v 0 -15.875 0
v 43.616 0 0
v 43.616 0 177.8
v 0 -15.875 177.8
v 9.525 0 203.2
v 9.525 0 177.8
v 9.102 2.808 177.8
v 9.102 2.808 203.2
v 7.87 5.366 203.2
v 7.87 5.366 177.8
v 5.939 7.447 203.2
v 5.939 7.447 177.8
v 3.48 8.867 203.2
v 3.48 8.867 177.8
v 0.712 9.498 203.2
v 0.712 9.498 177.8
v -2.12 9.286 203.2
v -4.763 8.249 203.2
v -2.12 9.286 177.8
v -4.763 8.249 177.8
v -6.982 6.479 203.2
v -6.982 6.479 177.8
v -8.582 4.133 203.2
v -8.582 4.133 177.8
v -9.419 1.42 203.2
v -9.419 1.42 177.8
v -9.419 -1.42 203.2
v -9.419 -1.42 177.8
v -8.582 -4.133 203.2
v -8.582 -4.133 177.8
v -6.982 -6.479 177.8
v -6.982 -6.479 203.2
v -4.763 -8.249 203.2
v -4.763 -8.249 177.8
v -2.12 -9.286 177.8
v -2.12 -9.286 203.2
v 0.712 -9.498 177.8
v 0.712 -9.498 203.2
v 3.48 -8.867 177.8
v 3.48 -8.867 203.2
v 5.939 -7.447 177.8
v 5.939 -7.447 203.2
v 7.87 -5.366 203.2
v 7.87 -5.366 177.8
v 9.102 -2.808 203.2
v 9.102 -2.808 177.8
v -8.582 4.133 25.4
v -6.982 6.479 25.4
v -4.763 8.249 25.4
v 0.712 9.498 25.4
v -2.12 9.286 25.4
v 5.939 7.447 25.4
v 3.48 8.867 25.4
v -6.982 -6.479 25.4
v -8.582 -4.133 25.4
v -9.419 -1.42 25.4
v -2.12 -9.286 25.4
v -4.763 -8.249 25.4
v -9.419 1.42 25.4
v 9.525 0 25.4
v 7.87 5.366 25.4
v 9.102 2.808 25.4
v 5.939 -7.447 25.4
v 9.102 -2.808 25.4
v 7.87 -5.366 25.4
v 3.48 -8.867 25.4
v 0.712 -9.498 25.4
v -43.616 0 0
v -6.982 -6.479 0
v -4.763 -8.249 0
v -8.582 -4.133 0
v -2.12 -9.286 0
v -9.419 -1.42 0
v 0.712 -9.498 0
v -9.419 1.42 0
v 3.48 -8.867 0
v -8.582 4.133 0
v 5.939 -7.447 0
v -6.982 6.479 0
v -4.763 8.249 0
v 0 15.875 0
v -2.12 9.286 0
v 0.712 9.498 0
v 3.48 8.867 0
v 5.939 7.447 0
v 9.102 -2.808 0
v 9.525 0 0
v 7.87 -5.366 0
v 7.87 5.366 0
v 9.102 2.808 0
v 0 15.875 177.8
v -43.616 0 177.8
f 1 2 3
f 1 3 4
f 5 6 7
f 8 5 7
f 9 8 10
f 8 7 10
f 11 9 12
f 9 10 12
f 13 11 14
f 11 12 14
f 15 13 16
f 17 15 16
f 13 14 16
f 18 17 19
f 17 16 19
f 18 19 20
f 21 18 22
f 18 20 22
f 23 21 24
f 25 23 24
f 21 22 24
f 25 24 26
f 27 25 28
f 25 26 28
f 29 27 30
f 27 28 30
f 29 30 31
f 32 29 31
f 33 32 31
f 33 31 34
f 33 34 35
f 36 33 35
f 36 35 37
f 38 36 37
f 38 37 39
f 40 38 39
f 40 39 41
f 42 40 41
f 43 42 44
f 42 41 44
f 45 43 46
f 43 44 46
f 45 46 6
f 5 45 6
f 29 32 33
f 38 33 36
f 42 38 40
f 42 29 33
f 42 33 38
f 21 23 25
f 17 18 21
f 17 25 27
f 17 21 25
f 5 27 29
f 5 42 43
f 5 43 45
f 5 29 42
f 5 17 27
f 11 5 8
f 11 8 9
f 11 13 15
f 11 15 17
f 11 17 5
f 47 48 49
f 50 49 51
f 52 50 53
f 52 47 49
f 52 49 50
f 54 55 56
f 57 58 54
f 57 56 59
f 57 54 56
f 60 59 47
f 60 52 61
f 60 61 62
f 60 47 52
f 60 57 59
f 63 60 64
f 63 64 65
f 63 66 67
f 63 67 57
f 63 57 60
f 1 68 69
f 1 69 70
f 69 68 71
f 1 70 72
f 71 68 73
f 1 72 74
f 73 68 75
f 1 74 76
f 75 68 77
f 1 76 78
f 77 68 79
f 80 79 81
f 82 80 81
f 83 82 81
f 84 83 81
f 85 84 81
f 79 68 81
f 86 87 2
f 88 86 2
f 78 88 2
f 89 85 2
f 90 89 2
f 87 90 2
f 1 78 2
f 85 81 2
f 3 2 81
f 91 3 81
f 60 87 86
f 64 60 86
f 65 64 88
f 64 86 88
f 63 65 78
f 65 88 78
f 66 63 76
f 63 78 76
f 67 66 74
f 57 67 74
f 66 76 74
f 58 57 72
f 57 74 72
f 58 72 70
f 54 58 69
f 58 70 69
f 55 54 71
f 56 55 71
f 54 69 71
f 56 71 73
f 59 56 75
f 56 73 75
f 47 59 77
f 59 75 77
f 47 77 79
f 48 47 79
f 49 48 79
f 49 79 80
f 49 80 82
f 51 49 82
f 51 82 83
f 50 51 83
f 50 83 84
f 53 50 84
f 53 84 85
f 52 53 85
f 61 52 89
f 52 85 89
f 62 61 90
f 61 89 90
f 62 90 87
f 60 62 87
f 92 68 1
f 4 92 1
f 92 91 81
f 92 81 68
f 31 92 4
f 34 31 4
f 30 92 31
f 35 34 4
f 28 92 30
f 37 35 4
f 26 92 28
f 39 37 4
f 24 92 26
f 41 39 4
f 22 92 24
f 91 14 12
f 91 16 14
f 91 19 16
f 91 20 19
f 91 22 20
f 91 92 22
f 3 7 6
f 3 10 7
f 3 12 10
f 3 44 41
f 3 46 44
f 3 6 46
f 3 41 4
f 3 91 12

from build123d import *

# Parameters (mm, degrees)
F0_W        = 101.6
F0_H        = 31.75
F1_DEPTH    = 177.8
F2_T1_DEPTH = 441.3701848271
F3_R        = 9.525
F4_DEPTH    = 25.4
F5_R        = 9.525
F6_DEPTH    = 25.4


# Not quite as in the source:
# - a fillet or chamfer that OpenCascade refuses, or shapes differently, is made with other operations: its cross-section is extruded or revolved along the edge and cut away or added


with BuildPart() as f1:
    # F0 (on Top) → F1 (new body)
    with BuildSketch(Plane.XY):
        Rectangle(F0_W, F0_H)
    extrude(amount=F1_DEPTH)

    # F2: chamfer of 50.8 x 18.4896879007 on 4 edges, made by hand

    # F2_s2 → F2_t1 (cut)
    with BuildSketch(Plane.XY.offset(-131.7850924136)):
        Polygon((50.8, -2.6146879007), (0, 15.875), (50.8, 15.875), align=None)
        Polygon((50.8, 2.6146879007), (0, -15.875), (50.8, -15.875), align=None)
        Polygon((-50.8, 2.6146879007), (0, -15.875), (-50.8, -15.875), align=None)
        Polygon((0, 15.875), (-50.8, -2.6146879007), (-50.8, 15.875), align=None)
    extrude(amount=F2_T1_DEPTH, mode=Mode.SUBTRACT)

    # F3 (on face) → F4 (join)
    with BuildSketch(Plane.XY.offset(177.8)):
        Circle(F3_R)
    extrude(amount=F4_DEPTH)

    # F5 (on face) → F6 (cut)
    with BuildSketch(Plane(origin=(0, 0, 0), x_dir=(1, 0, 0), z_dir=(0, 0, -1))):
        Circle(F5_R)
    extrude(amount=-F6_DEPTH, mode=Mode.SUBTRACT)


solid = f1.part
